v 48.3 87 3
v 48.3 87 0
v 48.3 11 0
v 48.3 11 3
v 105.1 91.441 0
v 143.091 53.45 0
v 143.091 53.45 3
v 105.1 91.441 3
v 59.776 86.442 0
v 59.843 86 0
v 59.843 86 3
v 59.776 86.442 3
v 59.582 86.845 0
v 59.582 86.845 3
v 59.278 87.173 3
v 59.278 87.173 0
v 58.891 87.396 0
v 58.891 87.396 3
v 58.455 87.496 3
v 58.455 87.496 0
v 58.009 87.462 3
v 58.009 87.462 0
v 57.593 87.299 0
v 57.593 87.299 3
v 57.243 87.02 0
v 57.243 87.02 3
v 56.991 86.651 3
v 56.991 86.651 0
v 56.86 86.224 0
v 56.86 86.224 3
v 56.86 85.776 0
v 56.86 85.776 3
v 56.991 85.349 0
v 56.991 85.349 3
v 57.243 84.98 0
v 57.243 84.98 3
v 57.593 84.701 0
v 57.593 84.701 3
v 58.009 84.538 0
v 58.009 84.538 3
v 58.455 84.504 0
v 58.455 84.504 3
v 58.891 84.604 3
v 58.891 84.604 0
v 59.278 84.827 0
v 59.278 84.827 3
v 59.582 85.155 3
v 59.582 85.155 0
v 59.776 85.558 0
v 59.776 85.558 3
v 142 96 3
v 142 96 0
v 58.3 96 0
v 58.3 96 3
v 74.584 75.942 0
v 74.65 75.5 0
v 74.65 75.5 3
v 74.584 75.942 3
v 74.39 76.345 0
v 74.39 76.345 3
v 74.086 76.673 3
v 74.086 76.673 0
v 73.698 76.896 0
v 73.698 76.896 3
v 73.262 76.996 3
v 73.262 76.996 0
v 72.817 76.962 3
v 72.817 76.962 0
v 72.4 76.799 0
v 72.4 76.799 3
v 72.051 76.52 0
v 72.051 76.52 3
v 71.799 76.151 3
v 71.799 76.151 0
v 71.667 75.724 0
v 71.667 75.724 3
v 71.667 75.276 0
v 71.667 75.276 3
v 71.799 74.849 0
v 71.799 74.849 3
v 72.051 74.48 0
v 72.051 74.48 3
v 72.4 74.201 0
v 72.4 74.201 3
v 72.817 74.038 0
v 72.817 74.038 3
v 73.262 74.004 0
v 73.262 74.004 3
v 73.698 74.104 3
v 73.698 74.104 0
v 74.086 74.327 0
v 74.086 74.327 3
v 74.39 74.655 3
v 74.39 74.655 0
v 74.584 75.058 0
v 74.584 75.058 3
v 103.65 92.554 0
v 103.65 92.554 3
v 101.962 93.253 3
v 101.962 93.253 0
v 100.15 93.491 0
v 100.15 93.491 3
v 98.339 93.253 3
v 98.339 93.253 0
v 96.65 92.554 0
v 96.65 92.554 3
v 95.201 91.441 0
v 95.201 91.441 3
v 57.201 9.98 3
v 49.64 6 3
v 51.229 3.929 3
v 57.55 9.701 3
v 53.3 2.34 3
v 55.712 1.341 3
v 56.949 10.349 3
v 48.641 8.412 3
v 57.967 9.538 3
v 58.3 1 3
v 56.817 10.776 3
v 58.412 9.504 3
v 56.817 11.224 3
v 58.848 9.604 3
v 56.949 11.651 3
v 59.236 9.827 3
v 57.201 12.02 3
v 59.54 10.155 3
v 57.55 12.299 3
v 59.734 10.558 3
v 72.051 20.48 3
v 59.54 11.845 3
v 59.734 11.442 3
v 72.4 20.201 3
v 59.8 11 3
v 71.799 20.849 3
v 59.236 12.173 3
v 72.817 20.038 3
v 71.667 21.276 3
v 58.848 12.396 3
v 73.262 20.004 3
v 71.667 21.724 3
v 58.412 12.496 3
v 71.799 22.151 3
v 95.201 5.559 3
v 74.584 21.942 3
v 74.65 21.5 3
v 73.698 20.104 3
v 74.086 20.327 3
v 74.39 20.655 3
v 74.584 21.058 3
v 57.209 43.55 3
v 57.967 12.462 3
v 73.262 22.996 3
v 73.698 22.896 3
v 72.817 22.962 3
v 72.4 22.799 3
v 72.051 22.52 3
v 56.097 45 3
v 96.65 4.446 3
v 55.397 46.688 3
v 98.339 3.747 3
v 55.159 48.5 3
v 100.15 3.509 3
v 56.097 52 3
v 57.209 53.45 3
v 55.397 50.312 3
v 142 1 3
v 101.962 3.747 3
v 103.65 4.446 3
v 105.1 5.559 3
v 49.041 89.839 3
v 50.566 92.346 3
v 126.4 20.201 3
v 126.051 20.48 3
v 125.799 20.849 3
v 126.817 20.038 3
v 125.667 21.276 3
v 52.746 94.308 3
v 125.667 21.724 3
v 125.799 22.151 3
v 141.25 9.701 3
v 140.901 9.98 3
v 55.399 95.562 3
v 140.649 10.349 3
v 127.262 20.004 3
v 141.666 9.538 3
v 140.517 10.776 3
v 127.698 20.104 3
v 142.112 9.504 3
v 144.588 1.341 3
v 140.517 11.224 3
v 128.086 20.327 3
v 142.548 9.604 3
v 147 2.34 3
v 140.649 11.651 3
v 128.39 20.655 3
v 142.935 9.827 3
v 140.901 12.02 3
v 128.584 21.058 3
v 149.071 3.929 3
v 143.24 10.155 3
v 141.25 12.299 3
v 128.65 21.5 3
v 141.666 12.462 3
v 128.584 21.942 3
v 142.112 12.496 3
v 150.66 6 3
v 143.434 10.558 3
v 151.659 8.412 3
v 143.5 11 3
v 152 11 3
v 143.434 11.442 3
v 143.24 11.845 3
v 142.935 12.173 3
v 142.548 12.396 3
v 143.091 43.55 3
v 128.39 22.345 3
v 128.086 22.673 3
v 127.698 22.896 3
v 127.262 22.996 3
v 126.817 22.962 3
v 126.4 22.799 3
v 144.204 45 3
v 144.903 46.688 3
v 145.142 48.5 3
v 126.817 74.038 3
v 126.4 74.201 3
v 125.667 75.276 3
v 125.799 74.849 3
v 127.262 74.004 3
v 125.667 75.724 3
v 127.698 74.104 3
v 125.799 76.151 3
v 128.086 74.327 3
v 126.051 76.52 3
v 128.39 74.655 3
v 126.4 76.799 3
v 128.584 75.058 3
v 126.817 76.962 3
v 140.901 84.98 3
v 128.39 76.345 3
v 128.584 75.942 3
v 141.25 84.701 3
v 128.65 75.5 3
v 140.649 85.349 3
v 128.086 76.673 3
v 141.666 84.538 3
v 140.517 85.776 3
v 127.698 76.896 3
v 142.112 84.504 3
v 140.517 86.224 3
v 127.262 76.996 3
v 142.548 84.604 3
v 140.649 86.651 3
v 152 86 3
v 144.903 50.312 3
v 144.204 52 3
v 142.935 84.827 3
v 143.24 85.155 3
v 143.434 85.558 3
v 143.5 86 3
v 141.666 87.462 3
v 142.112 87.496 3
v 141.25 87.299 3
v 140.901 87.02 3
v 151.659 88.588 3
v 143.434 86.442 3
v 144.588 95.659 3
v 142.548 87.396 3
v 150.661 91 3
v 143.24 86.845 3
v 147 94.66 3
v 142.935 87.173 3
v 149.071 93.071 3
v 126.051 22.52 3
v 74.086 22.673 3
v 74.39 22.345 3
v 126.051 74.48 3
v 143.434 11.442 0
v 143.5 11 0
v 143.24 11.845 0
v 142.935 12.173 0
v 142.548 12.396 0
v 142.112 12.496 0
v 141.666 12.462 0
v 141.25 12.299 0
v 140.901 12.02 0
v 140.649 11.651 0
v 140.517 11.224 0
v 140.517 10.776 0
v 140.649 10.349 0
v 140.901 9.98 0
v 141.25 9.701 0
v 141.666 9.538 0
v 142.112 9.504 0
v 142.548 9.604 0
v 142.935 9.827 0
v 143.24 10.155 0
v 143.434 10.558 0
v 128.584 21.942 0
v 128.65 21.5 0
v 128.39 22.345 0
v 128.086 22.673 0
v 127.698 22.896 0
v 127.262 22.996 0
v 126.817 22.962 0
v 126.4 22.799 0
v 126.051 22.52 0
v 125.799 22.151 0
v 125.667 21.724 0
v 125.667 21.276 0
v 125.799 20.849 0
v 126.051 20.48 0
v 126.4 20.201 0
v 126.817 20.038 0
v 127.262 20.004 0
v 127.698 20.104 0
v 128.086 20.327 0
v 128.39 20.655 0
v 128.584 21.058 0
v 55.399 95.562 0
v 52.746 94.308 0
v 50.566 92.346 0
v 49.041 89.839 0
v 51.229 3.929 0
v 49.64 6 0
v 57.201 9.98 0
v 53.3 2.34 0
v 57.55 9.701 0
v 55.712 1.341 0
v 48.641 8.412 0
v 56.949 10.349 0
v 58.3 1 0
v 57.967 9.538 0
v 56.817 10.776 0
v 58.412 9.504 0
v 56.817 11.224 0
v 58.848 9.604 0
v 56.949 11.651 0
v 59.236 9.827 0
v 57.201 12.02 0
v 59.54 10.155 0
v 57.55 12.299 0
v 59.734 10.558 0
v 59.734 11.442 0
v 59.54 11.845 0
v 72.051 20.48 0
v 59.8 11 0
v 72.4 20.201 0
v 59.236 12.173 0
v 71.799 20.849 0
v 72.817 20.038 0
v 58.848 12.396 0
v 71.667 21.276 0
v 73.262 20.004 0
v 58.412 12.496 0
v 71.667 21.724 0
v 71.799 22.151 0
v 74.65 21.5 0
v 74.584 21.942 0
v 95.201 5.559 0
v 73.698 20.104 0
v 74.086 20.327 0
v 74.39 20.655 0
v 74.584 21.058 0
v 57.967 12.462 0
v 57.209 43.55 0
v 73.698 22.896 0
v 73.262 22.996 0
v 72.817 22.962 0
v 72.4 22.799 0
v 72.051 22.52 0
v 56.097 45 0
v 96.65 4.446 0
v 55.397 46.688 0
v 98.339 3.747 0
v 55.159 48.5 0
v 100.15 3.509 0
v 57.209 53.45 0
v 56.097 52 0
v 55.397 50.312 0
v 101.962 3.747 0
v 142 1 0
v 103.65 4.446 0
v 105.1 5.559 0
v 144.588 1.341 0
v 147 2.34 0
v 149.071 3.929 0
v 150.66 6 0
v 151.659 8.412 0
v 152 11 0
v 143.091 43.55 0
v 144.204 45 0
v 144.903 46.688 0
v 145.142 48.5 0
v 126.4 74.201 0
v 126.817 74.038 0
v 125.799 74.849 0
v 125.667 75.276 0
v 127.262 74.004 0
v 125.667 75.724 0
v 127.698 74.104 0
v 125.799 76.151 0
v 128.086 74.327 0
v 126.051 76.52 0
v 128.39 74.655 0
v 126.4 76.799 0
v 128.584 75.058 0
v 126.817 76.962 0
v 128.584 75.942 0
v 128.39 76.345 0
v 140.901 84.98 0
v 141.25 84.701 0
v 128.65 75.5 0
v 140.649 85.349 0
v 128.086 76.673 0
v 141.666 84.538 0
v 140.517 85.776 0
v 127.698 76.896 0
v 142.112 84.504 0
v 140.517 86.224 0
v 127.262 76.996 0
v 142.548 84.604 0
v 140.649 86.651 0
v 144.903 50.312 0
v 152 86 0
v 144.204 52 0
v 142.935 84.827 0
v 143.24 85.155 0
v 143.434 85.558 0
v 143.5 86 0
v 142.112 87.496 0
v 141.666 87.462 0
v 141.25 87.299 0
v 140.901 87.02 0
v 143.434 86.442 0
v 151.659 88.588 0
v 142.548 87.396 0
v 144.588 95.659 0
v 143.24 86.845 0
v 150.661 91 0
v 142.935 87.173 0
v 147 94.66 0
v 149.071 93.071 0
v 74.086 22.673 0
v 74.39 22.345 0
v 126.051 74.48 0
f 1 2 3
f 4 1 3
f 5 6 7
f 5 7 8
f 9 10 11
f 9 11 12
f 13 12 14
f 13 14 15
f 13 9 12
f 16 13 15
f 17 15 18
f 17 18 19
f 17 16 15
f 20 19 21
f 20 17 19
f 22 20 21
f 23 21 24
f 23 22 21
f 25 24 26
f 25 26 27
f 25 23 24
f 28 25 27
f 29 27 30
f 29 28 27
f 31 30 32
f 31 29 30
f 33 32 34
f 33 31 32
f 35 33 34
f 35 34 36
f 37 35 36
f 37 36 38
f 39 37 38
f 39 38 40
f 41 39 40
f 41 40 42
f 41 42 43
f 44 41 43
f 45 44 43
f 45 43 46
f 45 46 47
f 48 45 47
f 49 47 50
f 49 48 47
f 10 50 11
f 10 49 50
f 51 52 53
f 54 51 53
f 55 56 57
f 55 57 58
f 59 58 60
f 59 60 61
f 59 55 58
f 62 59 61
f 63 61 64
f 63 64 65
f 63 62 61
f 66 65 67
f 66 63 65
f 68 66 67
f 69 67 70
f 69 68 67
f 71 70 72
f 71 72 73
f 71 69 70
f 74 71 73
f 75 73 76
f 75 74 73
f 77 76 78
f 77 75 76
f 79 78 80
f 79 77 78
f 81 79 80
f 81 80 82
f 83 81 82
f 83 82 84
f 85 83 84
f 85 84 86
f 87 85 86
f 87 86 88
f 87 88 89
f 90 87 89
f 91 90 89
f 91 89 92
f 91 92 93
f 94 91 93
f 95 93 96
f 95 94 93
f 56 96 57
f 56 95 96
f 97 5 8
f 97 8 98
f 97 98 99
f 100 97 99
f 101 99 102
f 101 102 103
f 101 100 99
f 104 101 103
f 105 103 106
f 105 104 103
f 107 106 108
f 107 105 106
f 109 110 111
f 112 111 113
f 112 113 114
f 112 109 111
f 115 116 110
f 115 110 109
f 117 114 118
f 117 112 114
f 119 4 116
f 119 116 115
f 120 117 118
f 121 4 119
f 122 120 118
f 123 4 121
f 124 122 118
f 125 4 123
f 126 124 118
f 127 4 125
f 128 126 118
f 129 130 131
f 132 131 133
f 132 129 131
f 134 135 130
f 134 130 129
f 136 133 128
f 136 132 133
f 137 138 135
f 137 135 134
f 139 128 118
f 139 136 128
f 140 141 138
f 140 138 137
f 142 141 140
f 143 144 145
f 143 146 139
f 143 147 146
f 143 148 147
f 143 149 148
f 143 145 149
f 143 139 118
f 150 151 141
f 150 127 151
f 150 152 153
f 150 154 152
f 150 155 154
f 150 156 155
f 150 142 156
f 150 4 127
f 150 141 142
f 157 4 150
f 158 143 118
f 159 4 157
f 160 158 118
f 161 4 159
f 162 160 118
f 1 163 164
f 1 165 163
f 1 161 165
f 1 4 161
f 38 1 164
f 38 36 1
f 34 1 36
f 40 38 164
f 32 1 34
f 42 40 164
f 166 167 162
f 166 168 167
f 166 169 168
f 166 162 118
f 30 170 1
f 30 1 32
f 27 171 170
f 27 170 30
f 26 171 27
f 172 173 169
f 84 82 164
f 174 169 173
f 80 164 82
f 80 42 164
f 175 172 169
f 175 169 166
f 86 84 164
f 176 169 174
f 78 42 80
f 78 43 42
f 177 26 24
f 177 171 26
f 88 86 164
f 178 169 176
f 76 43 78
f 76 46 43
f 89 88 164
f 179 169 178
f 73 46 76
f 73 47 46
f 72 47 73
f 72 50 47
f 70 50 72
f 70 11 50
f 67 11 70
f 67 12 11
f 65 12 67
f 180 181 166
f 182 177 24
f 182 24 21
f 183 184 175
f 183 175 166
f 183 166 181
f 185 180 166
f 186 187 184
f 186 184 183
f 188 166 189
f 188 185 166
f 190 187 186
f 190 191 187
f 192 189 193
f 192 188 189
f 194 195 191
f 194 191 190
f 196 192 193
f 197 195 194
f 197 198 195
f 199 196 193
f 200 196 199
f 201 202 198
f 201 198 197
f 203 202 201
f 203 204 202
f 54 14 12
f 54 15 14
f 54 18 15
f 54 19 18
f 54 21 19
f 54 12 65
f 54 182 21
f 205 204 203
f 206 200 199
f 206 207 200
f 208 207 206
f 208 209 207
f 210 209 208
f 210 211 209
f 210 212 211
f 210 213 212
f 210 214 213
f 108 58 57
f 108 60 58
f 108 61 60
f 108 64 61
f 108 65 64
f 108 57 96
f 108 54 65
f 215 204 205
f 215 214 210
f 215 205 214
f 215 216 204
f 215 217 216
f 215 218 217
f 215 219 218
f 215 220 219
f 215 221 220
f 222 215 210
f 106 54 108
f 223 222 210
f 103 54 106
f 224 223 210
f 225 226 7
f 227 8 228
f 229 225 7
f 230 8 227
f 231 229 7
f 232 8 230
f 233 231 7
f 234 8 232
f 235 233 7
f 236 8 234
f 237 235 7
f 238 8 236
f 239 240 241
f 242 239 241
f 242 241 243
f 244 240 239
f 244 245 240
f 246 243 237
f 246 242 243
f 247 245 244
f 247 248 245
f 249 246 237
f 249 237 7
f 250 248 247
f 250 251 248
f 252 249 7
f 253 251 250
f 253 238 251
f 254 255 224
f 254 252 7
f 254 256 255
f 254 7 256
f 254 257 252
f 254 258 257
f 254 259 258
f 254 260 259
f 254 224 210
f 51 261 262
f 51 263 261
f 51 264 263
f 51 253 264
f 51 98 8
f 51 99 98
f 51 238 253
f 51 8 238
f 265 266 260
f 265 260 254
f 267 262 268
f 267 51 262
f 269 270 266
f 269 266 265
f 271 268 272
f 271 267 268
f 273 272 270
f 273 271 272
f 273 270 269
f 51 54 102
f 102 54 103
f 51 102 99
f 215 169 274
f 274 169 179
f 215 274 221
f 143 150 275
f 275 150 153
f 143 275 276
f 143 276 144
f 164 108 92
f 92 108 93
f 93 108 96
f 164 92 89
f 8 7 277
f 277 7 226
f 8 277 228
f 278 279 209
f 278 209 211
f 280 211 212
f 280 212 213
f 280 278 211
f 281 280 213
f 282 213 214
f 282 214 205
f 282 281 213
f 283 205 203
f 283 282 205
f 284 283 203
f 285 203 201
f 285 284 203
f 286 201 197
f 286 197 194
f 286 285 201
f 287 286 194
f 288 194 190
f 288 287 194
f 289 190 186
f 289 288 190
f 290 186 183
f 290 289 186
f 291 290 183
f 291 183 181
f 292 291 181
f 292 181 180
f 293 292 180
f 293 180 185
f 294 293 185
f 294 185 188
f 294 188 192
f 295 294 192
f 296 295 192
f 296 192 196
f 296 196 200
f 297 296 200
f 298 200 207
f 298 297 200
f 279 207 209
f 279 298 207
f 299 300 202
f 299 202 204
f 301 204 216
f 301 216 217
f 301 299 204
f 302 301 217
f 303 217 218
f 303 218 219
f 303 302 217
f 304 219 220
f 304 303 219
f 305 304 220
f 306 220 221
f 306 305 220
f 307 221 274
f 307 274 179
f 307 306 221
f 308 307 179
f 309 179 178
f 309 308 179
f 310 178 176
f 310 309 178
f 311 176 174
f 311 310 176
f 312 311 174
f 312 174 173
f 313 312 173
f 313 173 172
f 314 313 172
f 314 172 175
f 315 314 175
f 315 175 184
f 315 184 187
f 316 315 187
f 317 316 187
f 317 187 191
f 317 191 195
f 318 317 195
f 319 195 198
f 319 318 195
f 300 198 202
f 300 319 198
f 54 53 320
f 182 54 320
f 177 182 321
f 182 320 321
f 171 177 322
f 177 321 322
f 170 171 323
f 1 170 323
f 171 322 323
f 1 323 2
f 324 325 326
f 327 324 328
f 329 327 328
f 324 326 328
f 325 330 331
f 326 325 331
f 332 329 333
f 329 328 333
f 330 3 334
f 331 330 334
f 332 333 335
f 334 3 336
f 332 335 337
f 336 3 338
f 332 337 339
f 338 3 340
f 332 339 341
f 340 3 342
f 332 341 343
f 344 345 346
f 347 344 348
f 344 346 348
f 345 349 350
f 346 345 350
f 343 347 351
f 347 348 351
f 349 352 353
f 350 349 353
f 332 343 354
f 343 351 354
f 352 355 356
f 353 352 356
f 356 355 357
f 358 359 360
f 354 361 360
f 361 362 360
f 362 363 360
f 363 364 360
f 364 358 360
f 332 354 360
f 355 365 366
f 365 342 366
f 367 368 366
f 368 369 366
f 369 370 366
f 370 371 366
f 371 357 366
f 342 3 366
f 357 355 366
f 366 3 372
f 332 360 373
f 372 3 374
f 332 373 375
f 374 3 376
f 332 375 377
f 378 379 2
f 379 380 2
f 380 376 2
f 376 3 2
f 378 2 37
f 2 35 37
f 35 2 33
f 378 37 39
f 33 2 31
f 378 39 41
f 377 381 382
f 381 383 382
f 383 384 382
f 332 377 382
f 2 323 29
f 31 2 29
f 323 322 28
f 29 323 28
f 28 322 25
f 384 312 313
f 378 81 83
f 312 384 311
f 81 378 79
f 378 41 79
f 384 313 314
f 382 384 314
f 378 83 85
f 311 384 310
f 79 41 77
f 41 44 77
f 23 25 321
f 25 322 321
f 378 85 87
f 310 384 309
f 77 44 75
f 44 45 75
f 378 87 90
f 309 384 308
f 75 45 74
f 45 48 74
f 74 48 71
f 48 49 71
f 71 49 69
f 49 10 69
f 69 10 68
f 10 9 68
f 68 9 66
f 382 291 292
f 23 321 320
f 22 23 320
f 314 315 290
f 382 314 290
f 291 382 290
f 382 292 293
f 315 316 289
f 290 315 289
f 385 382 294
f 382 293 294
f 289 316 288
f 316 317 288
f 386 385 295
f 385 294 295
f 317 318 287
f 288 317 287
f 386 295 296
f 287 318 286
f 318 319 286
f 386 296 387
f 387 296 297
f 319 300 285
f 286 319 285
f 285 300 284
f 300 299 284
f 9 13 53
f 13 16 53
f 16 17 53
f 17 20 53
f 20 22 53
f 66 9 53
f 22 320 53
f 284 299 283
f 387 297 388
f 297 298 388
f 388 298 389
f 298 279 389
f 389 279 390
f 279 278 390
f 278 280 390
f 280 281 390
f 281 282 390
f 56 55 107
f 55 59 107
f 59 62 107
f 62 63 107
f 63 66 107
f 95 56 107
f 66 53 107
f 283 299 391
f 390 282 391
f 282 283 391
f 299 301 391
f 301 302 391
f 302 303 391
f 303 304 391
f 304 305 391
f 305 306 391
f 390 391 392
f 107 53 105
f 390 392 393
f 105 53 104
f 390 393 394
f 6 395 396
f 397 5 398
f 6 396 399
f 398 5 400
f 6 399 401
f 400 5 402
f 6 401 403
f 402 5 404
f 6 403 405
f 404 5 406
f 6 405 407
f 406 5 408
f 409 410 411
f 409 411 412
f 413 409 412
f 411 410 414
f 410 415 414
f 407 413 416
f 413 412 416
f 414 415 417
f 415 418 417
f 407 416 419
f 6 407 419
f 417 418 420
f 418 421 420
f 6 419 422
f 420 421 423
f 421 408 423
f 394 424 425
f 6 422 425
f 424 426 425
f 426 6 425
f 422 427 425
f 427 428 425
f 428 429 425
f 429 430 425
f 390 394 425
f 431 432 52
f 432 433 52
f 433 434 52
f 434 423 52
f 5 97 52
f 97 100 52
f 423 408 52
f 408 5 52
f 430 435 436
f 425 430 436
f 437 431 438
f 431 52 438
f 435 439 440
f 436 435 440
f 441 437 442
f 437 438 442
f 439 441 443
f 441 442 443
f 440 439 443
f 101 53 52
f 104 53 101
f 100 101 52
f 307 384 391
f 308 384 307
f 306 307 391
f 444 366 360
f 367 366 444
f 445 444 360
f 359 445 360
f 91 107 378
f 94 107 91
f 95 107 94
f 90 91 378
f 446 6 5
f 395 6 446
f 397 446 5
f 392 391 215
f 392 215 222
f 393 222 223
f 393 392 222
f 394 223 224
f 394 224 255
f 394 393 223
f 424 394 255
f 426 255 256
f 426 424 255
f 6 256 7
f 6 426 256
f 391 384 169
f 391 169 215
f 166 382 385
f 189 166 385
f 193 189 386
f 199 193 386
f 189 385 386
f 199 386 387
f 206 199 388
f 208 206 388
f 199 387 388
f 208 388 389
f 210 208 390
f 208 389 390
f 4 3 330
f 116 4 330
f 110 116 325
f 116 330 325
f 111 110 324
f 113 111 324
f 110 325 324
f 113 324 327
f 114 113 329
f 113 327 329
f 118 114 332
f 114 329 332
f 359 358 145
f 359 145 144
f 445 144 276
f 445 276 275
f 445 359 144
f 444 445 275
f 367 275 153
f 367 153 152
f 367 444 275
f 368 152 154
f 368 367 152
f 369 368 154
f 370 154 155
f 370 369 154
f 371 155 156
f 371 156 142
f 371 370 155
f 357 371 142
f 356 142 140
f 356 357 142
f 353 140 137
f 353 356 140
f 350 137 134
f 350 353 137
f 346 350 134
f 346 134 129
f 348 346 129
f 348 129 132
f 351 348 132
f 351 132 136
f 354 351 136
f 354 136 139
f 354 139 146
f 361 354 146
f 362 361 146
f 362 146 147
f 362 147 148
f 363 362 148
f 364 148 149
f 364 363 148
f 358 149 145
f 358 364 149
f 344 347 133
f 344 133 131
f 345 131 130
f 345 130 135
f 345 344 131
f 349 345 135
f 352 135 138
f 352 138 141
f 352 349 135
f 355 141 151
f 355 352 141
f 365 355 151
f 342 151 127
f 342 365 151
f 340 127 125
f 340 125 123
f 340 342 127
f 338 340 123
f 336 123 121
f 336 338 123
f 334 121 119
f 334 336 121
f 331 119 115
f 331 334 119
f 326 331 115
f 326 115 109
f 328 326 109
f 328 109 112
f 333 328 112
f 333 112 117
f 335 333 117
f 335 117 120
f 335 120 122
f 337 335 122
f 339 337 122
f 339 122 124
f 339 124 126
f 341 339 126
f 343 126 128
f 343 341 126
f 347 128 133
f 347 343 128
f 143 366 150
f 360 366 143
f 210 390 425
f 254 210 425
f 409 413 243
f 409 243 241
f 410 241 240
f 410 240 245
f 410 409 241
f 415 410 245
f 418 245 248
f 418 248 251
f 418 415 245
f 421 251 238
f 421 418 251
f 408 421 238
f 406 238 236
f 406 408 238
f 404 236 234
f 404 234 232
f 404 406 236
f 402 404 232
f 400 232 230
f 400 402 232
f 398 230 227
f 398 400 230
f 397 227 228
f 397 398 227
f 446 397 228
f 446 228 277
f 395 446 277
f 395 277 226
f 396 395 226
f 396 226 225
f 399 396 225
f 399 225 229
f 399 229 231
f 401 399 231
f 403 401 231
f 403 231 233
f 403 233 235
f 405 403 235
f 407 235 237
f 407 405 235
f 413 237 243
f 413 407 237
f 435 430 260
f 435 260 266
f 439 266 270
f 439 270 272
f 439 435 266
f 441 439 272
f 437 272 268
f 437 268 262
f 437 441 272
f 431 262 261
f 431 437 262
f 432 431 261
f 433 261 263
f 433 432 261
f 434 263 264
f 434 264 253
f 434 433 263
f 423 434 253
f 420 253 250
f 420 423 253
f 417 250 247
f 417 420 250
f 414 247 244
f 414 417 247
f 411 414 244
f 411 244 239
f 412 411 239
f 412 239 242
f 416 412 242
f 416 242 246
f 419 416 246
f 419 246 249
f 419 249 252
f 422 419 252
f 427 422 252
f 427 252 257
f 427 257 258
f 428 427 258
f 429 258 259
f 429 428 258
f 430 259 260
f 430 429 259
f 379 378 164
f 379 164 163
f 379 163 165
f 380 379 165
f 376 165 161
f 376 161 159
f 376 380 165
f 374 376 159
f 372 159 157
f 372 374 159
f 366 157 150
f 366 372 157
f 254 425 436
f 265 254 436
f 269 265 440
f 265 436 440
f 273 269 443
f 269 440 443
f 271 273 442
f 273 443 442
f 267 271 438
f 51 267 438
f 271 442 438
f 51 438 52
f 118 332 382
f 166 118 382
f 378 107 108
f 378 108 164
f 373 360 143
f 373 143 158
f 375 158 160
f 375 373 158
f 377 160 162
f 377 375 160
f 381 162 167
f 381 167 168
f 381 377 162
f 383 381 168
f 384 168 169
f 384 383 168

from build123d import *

# Parameters (mm, degrees)
SKETCH_1_R      = 1.5
EXTRUDE_1_DEPTH = 3


with BuildPart() as part:
    # 草圖1 → 填料-伸長1 (new body)
    with BuildSketch(Plane.XY):
        with BuildLine():
            Line((58.3003, 1), (142.0003, 1))
            ThreePointArc((142.0003, 1), (149.071310355, 3.928960355), (152.0002, 11))
            Line((152.0002, 11), (152.0002, 86))
            ThreePointArc((152.0002, 86), (149.071335355, 93.071064644), (142.0003, 96))
            Line((142.0003, 96), (58.3003, 96))
            ThreePointArc((58.3003, 96), (51.584341425, 93.406620638), (48.3003, 87))
            Line((48.3003, 87), (48.3003, 11))
            ThreePointArc((48.3003, 11), (51.22925, 3.92895), (58.3003, 1))
        make_face()
        with Locations((73.150306055, 21.499982809)):
            Circle(SKETCH_1_R, mode=Mode.SUBTRACT)
        with Locations((58.3003, 11)):
            Circle(SKETCH_1_R, mode=Mode.SUBTRACT)
        with Locations((142.000224541, 10.999975458)):
            Circle(SKETCH_1_R, mode=Mode.SUBTRACT)
        with Locations((127.150308327, 21.499982809)):
            Circle(SKETCH_1_R, mode=Mode.SUBTRACT)
        with Locations((142.000224541, 86)):
            Circle(SKETCH_1_R, mode=Mode.SUBTRACT)
        with Locations((127.150308327, 75.500030546)):
            Circle(SKETCH_1_R, mode=Mode.SUBTRACT)
        with Locations((73.150306055, 75.500030546)):
            Circle(SKETCH_1_R, mode=Mode.SUBTRACT)
        with Locations((58.342751992, 86)):
            Circle(SKETCH_1_R, mode=Mode.SUBTRACT)
        with BuildLine():
            Line((124.449289873, 24.90807964), (143.091425497, 43.550215264))
            ThreePointArc((143.091425497, 43.550215264), (145.141678029, 48.499962732), (143.091425497, 53.4497102))
            Line((143.091425497, 53.4497102), (105.100047468, 91.441088229))
            ThreePointArc((105.100047468, 91.441088229), (100.1503, 93.491340761), (95.200552532, 91.441088229))
            Line((95.200552532, 91.441088229), (76.558416908, 72.798952605))
            Line((76.558416908, 72.798952605), (57.209174503, 53.4497102))
            ThreePointArc((57.209174503, 53.4497102), (55.158921971, 48.499962732), (57.209174503, 43.550215264))
            Line((57.209174503, 43.550215264), (95.200552532, 5.558837235))
            ThreePointArc((95.200552532, 5.558837235), (100.1503, 3.508584704), (105.100047468, 5.558837235))
            Line((105.100047468, 5.558837235), (124.449289873, 24.90807964))
        make_face(mode=Mode.SUBTRACT)
    extrude(amount=EXTRUDE_1_DEPTH)


solid = part.part
